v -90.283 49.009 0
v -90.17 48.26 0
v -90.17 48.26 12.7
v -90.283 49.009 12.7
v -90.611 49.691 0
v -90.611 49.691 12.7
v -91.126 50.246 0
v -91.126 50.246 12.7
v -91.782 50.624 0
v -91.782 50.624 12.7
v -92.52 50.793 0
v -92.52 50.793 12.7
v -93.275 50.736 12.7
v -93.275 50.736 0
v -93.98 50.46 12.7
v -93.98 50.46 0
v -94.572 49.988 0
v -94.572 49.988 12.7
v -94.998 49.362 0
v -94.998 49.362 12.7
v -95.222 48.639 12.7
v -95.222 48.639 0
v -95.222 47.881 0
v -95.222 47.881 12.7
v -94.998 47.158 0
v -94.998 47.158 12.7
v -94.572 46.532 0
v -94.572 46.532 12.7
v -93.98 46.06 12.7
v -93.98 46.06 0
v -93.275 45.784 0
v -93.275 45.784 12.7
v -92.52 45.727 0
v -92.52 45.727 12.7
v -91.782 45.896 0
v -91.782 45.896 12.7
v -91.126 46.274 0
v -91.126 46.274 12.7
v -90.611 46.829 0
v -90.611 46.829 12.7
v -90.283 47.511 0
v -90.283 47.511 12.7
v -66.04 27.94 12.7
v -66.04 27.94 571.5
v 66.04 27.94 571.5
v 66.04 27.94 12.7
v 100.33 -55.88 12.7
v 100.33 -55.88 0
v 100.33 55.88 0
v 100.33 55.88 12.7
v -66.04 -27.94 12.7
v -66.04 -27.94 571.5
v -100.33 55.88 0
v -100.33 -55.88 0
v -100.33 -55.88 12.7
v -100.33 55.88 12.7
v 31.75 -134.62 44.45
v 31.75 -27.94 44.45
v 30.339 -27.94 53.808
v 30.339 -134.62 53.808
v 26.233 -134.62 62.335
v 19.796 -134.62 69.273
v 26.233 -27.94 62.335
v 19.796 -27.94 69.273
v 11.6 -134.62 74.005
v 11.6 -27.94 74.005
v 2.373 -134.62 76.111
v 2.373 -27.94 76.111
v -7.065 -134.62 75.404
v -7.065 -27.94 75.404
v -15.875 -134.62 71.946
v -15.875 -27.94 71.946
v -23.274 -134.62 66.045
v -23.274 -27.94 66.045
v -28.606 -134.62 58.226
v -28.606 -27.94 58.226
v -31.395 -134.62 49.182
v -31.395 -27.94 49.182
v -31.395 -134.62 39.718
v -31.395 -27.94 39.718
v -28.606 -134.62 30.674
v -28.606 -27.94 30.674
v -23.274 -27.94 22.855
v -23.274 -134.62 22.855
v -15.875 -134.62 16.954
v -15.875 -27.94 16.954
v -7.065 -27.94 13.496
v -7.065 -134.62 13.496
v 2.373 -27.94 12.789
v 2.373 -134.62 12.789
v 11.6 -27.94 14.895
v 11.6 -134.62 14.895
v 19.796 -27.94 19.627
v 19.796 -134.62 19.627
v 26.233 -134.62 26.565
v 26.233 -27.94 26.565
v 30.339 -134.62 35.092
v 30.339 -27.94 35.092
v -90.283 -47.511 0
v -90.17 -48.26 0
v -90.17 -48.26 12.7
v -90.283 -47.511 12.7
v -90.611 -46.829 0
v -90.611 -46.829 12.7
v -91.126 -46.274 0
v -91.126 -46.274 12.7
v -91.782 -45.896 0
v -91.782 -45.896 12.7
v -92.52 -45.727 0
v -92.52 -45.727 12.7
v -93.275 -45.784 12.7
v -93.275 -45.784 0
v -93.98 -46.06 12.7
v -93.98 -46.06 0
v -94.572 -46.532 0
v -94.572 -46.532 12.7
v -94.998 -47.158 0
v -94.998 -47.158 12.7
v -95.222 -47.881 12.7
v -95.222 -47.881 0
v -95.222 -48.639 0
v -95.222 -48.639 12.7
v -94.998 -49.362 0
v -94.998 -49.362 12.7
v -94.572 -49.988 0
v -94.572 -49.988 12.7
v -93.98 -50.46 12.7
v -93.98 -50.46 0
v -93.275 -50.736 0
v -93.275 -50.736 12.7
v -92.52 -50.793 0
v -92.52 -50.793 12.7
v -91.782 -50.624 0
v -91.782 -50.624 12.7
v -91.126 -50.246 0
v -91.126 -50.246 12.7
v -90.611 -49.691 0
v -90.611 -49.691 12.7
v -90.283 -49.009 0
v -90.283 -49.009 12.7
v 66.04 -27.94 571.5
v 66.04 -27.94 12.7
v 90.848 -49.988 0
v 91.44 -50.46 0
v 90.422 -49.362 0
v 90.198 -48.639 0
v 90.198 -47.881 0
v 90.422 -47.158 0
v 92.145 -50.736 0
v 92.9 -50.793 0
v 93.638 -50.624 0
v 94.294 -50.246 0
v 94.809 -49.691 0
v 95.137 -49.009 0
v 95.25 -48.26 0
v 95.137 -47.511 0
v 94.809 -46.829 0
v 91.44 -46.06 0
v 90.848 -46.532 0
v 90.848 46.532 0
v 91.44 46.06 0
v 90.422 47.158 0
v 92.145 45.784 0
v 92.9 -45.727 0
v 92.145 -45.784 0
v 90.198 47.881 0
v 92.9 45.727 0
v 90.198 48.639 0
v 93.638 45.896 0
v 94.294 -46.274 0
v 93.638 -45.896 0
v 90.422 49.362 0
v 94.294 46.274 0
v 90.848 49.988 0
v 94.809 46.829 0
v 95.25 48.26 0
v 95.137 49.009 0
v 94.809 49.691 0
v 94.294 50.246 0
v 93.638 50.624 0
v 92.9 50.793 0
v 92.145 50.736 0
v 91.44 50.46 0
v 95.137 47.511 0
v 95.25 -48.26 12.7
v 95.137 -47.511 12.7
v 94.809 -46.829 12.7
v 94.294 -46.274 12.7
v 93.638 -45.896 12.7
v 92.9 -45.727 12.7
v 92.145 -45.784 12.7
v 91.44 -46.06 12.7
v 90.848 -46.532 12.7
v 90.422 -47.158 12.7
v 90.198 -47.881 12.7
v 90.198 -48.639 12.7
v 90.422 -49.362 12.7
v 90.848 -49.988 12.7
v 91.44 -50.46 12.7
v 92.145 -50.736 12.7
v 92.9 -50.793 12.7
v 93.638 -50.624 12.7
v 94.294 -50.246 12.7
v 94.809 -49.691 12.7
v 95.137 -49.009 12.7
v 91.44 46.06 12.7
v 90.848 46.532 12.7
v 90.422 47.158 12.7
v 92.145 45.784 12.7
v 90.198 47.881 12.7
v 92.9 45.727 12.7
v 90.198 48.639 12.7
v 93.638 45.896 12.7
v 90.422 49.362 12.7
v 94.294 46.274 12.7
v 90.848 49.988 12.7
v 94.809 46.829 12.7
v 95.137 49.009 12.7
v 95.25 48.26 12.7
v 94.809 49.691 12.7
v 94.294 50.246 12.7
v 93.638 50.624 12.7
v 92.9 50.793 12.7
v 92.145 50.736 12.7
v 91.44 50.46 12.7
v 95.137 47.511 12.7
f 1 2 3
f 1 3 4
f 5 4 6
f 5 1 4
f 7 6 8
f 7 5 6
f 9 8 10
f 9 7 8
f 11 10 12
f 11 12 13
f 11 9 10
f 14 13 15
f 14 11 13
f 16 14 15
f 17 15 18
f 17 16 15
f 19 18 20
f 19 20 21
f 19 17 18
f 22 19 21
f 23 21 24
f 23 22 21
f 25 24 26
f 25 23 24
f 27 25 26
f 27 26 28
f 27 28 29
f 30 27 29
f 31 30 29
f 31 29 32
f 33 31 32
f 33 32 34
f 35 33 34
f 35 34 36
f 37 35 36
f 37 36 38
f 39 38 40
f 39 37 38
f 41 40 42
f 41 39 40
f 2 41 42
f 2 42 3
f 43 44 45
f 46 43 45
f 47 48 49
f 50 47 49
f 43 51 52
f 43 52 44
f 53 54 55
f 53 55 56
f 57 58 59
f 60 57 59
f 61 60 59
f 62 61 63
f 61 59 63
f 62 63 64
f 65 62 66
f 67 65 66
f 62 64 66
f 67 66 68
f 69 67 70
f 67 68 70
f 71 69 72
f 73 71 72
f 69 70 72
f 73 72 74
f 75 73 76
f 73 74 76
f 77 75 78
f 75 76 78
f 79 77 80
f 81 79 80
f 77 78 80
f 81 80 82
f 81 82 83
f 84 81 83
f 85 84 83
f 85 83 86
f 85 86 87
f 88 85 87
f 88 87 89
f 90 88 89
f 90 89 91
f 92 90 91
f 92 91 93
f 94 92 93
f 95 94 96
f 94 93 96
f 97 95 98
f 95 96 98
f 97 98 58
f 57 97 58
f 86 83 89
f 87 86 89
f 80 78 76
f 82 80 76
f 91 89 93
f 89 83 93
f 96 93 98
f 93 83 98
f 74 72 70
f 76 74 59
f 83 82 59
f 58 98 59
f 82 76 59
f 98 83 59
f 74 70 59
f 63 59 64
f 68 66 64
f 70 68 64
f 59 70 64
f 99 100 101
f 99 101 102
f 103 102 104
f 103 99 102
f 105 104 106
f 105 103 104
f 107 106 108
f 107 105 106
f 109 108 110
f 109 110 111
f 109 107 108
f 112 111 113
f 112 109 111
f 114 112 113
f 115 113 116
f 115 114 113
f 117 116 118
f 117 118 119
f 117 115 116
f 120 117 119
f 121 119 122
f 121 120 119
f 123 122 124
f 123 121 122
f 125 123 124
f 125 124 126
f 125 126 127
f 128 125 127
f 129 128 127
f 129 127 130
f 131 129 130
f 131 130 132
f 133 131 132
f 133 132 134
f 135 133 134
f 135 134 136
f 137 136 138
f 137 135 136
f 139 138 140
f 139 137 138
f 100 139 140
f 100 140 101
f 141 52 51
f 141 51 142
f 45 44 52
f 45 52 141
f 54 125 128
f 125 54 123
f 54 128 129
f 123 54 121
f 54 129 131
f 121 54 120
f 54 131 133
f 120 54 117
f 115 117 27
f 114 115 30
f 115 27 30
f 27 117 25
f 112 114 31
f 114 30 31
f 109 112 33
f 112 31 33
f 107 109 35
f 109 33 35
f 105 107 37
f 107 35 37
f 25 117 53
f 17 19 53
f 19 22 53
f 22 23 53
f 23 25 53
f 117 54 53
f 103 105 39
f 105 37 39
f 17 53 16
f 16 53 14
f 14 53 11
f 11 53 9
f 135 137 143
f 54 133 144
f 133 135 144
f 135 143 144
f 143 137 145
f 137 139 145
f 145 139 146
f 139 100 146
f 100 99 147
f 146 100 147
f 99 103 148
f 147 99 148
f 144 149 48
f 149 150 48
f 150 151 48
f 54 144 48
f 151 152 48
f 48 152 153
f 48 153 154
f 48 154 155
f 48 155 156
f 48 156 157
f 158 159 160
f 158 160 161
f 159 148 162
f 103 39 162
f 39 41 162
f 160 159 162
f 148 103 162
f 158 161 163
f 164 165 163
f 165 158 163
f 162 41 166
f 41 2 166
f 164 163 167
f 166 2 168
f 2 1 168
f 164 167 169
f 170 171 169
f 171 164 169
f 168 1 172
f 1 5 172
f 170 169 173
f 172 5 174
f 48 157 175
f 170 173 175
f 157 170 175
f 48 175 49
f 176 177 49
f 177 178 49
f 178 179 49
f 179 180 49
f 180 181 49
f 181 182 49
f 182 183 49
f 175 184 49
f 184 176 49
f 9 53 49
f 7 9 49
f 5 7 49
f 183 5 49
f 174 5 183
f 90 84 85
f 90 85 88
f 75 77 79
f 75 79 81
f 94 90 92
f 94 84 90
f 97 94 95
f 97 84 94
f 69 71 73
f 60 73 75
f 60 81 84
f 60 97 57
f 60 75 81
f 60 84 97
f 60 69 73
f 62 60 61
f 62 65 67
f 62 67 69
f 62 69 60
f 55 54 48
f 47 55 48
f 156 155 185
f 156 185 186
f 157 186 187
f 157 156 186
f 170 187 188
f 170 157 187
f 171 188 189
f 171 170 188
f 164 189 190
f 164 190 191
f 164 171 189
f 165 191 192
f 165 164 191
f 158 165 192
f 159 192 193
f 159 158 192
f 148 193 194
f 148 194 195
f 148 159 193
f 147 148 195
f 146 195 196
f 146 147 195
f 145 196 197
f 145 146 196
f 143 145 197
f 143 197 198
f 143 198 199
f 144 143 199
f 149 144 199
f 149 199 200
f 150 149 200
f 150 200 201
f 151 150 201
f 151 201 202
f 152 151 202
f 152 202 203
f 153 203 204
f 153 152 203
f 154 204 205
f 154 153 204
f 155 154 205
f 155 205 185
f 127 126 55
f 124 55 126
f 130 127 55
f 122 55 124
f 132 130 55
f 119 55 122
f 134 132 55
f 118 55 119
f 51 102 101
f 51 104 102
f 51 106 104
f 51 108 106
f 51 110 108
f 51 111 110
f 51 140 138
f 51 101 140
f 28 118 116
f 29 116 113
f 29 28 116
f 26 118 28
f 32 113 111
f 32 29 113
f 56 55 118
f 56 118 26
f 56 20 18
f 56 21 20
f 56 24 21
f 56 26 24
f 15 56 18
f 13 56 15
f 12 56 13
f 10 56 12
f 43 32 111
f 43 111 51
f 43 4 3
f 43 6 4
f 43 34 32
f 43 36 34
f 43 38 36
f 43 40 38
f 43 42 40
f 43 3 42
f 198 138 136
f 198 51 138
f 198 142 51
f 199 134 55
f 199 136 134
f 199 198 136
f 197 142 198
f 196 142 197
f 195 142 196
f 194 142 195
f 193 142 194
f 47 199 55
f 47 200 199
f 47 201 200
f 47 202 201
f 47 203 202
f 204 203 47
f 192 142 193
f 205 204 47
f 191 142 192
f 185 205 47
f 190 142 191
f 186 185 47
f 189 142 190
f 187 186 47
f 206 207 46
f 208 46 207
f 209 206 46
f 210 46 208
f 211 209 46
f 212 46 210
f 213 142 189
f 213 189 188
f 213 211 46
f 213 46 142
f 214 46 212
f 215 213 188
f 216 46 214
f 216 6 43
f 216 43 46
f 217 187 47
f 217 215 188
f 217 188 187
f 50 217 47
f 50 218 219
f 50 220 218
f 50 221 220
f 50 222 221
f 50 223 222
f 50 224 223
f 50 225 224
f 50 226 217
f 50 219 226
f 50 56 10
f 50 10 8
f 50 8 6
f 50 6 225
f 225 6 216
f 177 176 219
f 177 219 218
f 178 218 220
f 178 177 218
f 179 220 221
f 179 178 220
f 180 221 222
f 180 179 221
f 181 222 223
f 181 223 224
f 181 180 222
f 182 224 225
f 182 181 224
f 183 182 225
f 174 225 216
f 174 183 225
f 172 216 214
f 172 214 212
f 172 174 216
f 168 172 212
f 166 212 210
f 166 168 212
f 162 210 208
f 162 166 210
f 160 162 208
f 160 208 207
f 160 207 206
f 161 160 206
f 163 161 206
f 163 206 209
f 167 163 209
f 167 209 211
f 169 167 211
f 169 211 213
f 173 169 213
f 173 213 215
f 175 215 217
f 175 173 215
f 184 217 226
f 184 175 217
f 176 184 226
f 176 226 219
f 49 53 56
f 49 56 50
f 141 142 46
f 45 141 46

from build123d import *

# Parameters (mm, degrees)
F0_W     = 200.66
F0_H     = 111.76
F0_R     = 2.54
F1_DEPTH = 12.7
F2_W     = 132.08
F2_H     = 55.88
F3_DEPTH = 558.8
F4_R     = 31.75
F5_DEPTH = 106.68


with BuildPart() as f1:
    # F0 (on Top) → F1 (new body)
    with BuildSketch(Plane.XY):
        Rectangle(F0_W, F0_H)
        with Locations((-92.71, -48.26)):
            Circle(F0_R, mode=Mode.SUBTRACT)
        with Locations((92.71, -48.26)):
            Circle(F0_R, mode=Mode.SUBTRACT)
        with Locations((-92.71, 48.26)):
            Circle(F0_R, mode=Mode.SUBTRACT)
        with Locations((92.71, 48.26)):
            Circle(F0_R, mode=Mode.SUBTRACT)
    extrude(amount=F1_DEPTH)

    # F2 (on face) → F3 (join)
    with BuildSketch(Plane.XY.offset(12.7)):
        Rectangle(F2_W, F2_H)
    extrude(amount=F3_DEPTH)


with BuildPart() as f5:
    # F4 (on face) → F5 (new body)
    with BuildSketch(Plane.XZ.offset(27.94)):
        with Locations((0, 44.45)):
            Circle(F4_R)
    extrude(amount=F5_DEPTH)


solid = Compound([f1.part, f5.part])
